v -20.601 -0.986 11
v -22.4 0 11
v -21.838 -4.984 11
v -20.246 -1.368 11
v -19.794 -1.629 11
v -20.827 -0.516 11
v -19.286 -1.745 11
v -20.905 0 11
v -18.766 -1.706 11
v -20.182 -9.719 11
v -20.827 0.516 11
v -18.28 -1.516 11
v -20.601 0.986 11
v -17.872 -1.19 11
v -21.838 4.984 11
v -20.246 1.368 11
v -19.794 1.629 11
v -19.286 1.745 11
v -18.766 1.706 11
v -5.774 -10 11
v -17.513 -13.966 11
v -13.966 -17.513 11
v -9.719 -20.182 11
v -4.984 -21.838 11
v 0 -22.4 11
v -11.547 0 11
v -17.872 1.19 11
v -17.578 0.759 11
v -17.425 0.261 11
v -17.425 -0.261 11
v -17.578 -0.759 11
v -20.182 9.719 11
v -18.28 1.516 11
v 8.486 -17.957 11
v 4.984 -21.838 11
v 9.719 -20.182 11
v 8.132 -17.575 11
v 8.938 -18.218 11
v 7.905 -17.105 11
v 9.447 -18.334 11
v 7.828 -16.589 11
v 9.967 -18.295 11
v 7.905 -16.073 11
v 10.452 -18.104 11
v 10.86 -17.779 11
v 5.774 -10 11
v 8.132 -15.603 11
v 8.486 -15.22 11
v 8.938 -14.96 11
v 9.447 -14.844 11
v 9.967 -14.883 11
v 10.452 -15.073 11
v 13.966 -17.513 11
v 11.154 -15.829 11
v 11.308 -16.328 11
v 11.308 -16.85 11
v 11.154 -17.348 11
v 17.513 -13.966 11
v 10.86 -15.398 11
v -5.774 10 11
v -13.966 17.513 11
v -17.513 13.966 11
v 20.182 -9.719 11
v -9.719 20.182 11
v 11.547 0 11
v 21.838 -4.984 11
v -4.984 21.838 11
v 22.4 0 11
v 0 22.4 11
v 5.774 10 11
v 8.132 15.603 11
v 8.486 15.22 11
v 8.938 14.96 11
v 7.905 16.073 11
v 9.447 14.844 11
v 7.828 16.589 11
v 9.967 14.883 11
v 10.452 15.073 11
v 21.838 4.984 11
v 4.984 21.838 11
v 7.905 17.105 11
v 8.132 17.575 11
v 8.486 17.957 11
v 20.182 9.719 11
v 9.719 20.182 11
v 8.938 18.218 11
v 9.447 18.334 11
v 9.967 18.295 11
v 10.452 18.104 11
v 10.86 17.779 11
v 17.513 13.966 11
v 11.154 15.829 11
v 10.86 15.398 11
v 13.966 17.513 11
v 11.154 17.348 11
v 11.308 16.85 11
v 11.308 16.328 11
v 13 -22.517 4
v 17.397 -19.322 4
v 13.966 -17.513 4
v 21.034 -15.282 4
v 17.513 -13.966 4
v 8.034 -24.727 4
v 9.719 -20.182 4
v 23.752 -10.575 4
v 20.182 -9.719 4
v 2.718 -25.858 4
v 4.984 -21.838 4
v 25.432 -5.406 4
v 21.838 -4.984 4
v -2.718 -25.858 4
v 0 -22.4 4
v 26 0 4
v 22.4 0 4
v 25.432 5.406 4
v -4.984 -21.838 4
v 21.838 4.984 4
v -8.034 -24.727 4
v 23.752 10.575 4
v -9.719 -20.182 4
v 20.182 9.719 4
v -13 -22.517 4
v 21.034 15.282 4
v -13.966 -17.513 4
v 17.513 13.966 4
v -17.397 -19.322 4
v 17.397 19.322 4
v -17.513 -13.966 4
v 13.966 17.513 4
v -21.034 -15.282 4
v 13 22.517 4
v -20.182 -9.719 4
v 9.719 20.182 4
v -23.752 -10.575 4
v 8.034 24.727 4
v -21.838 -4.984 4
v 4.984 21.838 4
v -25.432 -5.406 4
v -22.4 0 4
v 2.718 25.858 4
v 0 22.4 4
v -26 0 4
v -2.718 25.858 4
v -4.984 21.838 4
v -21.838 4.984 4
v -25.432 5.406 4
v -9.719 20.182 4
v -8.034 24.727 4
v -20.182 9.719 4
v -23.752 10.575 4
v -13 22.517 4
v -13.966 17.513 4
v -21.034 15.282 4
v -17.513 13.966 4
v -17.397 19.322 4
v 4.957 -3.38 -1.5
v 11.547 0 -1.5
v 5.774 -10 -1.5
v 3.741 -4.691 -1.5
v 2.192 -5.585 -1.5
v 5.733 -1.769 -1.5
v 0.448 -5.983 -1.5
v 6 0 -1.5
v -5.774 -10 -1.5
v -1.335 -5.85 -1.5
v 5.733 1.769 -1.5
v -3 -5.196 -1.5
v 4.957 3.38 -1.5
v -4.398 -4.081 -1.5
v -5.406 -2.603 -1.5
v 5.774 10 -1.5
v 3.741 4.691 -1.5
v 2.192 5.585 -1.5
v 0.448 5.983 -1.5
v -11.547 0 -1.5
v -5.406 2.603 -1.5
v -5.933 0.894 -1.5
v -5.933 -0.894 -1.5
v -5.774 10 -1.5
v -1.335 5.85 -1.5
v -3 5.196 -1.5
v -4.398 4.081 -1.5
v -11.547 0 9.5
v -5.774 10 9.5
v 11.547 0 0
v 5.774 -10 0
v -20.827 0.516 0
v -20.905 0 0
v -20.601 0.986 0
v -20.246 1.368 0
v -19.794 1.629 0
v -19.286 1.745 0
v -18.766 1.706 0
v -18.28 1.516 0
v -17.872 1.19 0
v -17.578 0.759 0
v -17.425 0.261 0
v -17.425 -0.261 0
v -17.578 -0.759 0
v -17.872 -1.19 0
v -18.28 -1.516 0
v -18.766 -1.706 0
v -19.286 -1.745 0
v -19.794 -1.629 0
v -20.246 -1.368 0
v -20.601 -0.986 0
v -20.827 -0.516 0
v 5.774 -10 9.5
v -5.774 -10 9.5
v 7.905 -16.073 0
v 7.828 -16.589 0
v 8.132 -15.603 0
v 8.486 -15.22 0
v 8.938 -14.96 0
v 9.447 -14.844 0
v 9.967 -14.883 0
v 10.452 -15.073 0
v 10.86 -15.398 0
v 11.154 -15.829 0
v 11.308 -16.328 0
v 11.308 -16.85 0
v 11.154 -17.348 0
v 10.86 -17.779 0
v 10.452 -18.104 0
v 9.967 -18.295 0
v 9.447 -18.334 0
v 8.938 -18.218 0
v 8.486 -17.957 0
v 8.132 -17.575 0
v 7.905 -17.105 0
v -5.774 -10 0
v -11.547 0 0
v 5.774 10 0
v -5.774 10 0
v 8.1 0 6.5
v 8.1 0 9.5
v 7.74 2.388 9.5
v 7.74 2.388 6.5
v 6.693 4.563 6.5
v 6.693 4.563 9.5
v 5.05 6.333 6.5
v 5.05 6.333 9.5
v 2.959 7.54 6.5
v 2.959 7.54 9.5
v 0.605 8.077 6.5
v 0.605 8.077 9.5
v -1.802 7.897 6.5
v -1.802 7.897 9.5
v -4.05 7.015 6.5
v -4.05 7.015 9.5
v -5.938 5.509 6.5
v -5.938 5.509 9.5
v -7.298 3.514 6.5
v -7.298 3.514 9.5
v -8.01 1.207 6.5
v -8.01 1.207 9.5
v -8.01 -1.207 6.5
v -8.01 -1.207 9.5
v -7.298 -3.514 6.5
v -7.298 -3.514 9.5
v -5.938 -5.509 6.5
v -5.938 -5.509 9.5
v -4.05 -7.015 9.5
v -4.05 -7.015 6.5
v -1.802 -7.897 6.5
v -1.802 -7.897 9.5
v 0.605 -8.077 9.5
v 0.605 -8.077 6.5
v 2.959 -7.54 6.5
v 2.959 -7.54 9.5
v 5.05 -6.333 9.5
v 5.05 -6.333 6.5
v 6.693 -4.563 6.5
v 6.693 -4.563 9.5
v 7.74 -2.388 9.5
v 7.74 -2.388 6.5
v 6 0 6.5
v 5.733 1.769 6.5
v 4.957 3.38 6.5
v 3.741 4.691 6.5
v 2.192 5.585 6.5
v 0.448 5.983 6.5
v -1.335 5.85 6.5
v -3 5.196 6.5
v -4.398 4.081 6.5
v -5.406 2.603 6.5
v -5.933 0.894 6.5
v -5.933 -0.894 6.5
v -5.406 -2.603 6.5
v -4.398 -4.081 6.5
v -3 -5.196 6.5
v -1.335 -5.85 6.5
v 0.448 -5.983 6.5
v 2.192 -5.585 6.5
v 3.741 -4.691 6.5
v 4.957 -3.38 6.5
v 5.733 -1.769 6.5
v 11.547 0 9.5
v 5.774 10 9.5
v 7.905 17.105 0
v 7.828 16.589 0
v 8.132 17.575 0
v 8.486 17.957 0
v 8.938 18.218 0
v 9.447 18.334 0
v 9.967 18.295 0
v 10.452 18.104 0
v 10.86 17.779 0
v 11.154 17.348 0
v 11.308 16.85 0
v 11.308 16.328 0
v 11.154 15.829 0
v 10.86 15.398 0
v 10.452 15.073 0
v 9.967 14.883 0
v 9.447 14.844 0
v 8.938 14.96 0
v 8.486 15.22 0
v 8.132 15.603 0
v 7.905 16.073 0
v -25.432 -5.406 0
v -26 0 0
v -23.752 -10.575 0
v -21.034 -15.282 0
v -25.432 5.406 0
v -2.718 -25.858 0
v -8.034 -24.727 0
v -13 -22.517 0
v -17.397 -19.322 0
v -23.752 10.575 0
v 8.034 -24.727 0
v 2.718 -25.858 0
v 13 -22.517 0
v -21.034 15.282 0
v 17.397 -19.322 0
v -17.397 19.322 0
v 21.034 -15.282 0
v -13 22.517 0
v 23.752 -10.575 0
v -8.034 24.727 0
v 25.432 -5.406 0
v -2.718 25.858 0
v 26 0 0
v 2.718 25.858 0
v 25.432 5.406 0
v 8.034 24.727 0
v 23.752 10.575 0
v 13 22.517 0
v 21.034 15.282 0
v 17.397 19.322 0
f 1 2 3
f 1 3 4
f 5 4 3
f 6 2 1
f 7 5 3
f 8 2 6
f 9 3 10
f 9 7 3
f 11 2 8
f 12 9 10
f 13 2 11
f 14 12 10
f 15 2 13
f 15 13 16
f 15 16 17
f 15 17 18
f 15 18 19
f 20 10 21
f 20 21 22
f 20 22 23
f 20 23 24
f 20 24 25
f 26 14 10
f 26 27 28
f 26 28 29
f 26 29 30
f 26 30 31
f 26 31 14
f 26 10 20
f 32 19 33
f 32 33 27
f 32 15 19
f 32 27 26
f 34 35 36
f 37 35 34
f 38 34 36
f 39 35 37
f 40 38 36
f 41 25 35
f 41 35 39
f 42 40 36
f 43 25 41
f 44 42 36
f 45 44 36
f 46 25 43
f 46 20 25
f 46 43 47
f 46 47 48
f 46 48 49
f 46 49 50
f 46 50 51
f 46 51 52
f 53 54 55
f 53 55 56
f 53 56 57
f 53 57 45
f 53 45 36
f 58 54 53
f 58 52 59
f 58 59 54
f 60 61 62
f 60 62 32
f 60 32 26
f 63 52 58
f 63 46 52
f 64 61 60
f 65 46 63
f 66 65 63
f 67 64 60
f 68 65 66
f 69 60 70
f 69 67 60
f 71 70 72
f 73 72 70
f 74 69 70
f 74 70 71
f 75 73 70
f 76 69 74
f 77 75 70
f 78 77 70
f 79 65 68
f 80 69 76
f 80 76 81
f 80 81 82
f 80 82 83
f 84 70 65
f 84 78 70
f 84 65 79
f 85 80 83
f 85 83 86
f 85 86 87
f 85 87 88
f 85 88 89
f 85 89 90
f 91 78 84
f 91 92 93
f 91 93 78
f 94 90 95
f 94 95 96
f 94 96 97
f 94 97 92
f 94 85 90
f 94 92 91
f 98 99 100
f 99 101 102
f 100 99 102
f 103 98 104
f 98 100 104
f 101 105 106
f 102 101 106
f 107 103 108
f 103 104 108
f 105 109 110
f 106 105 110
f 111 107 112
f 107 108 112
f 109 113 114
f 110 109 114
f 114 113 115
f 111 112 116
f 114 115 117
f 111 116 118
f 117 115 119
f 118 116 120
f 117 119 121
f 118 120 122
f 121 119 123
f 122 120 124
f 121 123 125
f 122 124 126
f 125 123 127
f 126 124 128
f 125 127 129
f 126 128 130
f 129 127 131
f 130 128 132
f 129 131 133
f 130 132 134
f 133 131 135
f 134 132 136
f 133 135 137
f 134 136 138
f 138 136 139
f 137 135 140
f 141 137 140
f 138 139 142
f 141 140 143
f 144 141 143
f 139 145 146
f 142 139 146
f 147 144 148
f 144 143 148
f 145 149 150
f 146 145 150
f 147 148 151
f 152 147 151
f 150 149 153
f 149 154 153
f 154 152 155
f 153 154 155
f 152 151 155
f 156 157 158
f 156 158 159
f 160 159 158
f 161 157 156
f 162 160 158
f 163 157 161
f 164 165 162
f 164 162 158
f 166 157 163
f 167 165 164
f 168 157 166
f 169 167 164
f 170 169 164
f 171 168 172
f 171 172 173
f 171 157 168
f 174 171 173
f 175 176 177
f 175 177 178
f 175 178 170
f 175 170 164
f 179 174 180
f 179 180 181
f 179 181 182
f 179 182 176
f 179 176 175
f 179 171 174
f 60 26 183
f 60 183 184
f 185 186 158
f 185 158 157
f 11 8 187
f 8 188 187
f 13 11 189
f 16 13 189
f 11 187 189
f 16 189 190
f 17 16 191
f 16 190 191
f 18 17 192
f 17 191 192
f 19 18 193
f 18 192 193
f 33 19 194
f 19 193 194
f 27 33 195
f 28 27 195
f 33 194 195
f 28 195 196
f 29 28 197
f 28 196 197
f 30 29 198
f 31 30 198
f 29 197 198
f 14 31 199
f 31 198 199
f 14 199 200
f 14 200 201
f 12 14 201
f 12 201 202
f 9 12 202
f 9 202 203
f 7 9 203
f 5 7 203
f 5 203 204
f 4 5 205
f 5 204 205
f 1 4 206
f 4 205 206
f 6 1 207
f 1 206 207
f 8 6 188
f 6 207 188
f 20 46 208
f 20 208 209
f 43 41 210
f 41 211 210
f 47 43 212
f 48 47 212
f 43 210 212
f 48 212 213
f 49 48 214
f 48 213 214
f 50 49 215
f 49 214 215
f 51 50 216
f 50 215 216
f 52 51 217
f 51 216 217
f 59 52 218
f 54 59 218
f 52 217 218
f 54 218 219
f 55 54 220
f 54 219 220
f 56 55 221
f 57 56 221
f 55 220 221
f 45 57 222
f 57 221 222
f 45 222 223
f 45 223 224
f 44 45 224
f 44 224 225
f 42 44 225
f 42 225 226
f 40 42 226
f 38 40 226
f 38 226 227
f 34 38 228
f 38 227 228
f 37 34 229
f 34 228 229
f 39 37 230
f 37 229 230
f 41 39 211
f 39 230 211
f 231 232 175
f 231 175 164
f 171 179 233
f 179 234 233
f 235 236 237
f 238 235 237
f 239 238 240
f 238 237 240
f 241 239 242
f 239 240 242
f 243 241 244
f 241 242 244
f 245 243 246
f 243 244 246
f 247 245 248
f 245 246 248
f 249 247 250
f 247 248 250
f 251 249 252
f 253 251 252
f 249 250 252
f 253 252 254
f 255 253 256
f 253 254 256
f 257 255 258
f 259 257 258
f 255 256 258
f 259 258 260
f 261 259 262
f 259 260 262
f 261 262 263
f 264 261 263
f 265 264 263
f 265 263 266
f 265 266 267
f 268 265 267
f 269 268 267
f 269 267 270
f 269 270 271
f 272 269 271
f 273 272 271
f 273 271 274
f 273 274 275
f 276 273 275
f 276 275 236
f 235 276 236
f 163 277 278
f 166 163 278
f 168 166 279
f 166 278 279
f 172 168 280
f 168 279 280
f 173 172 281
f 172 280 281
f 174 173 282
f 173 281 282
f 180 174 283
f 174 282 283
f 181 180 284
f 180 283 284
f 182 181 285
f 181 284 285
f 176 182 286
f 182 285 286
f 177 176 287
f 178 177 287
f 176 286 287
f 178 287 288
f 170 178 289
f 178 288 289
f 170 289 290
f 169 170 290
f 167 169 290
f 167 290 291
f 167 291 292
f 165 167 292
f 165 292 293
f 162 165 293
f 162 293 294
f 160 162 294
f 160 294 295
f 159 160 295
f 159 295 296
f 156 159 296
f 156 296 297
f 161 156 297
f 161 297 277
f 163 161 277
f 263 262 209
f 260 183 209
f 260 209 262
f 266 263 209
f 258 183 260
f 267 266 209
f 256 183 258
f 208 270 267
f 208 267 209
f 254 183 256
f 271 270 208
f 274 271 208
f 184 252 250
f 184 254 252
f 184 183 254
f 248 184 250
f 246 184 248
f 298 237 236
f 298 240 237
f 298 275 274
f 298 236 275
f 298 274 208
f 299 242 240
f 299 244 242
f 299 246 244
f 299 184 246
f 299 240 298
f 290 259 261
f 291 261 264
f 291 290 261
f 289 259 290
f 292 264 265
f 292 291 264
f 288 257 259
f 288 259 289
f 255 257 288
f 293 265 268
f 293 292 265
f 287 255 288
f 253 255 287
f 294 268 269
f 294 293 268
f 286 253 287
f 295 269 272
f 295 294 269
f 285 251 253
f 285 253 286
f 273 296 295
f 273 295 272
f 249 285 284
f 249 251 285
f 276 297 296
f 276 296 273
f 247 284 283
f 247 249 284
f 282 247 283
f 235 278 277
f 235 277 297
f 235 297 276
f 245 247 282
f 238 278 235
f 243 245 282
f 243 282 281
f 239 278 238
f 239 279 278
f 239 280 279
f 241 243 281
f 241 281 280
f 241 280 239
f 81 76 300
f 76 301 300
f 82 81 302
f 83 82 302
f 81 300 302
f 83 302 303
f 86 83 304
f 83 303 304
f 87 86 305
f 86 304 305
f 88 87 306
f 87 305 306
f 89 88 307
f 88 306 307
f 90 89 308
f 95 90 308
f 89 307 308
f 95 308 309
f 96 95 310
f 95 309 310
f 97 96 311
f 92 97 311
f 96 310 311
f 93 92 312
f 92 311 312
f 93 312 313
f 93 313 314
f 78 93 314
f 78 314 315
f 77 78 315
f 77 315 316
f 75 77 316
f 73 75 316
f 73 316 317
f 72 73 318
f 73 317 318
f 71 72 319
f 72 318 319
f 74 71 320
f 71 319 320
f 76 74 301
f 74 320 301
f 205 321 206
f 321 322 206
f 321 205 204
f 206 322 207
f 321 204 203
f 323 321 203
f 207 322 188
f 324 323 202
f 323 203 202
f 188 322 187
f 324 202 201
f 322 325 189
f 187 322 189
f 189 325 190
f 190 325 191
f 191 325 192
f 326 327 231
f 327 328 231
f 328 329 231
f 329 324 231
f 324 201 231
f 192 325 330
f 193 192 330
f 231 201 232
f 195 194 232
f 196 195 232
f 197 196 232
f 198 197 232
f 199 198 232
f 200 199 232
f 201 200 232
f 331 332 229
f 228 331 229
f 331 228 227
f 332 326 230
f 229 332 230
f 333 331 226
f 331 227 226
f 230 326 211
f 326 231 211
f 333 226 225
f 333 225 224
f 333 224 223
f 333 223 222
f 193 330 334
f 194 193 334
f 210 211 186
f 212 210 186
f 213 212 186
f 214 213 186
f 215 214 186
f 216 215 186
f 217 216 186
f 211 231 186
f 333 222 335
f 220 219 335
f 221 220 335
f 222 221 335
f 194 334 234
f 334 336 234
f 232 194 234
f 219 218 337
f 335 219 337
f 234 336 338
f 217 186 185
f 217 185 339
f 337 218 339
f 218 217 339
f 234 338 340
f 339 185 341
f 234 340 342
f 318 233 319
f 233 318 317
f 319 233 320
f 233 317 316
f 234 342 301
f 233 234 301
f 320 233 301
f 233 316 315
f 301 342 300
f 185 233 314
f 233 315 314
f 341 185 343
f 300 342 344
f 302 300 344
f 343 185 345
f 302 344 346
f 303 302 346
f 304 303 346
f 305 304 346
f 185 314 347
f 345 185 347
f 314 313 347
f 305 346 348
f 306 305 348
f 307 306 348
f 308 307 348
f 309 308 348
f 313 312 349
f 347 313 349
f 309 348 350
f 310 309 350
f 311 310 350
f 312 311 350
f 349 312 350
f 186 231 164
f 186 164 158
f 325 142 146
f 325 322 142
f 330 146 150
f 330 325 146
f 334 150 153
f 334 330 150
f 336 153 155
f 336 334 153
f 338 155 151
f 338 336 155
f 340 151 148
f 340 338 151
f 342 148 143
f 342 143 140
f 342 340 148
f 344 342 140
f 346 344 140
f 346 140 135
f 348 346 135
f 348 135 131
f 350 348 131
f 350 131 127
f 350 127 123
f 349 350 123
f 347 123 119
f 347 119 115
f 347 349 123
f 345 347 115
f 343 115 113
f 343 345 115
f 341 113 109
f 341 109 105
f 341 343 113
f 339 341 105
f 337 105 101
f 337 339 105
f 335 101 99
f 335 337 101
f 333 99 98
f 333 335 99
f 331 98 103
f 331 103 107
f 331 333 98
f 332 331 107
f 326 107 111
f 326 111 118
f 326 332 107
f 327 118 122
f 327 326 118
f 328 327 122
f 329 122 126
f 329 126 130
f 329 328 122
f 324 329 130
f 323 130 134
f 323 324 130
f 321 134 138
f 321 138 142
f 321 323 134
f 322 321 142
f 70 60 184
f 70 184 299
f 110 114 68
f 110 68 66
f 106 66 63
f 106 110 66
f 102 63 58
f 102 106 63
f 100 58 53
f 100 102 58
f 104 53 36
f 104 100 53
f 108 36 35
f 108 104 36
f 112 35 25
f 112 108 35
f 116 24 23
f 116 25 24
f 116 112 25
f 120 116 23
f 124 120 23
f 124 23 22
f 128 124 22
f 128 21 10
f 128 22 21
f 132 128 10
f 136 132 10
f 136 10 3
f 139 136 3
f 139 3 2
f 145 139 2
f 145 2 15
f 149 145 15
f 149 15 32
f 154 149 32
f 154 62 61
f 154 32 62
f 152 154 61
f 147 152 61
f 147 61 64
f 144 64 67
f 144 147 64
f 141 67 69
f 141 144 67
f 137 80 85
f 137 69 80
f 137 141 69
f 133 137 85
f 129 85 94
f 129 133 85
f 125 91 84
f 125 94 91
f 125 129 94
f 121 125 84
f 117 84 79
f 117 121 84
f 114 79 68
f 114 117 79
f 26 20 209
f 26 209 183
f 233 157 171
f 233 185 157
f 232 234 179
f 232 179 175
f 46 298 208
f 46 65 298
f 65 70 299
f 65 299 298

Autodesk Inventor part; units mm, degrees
ref_plane "YZ Plane" through (0, 0, 0) normal (1, 0, 0) x (0, 1, 0)
ref_plane "XZ Plane" through (0, 0, 0) normal (0, 1, 0) x (-1, 0, 0)
sketch "Sketch1" plane through (0, 0, 0) normal (0, 0, 1) x (1, 0, 0)
  circle A0 centre (0, 0) radius 22.4
  dimension "d0" = 44.8
extrude "Extrusion1" add sketch "Sketch1" along normal blind 11
sketch "Sketch8" plane through (0, 0, 0) normal (0, 0, -1) x (-1, 0, 0)
  circle A0 centre (0, 0) radius 26
  dimension "d23" = 52
extrude "Extrusion7" add sketch "Sketch8" against normal blind 4
sketch "Sketch2" plane through (0, 0, 0) normal (0, 0, -1) x (-1, 0, 0)
  circle A0 centre (19.155, 0) radius 1.75
  circle A1 centre (-9.5775, 16.5887) radius 1.75
  circle A2 centre (-9.5775, -16.5887) radius 1.75
  point P0 (0, 0)
  dimension "d3" = 3.5
  dimension "d4" = 19.155
  dimension "d7" = 360
extrude "Extrusion2" cut sketch "Sketch2" against normal through all
sketch "Sketch3" plane through (0, 0, 11) normal (0, 0, 1) x (1, 0, 0)
  circle A0 centre (0, 0) radius 6
  dimension "d11" = 12
extrude "Extrusion3" cut sketch "Sketch3" against normal blind 2
sketch "Sketch4" plane through (0, 0, 11) normal (0, 0, 1) x (1, 0, 0)
  circle A0 centre (0, 0) radius 6 projected
  line L0 (11.547, 0) -> (5.7735, -10)
  line L1 (5.7735, -10) -> (-5.7735, -10)
  line L2 (-5.7735, -10) -> (-11.547, 0)
  line L3 (-11.547, 0) -> (-5.7735, 10)
  line L4 (-5.7735, 10) -> (5.7735, 10)
  line L5 (5.7735, 10) -> (11.547, 0)
  circle A1 centre (0, 0) radius 6
  dimension "d14" = 10
extrude "Extrusion4" cut sketch "Sketch4" against normal blind 1.5
sketch "Sketch5" plane through (0, 0, 0) normal (0, 0, -1) x (-1, 0, 0)
  line L0 (5.7735, 10) -> (-5.7735, 10) projected
  line L1 (-5.7735, 10) -> (5.7735, 10)
  line L2 (5.7735, 10) -> (11.547, 0)
  line L3 (11.547, 0) -> (5.7735, -10)
  line L4 (5.7735, -10) -> (-5.7735, -10)
  line L5 (-5.7735, -10) -> (-11.547, 0)
  line L6 (-11.547, 0) -> (-5.7735, 10)
  point P0 (0, 0)
  point P1 (0, 0)
extrude "Extrusion5" add sketch "Sketch5" along normal blind 1.5
ref_plane "Work Plane1" through (0, 0, 4.5) normal (0, 0, 1) x (1, 0, 0)
sketch "Sketch6" plane through (0, 0, 4.5) normal (0, 0, 1) x (1, 0, 0)
  circle A0 centre (0, 0) radius 22.6071
  circle A1 centre (0, 0) radius 21.1
  dimension "d20" = 42.2
extrude "Extrusion6" [suppressed]
sketch "Sketch7" plane through (0, 0, 0) normal (0, 0, -1) x (-1, 0, 0)
  point P0 (0, 0)
sketch "Sketch9" plane through (0, 0, 9.5) normal (0, 0, 1) x (1, 0, 0)
  circle A0 centre (0, 0) radius 6 projected
  circle A1 centre (0, 0) radius 8.1
  dimension "d26" = 16.2
extrude "Extrusion8" cut sketch "Sketch9" against normal blind 3 contours A0 | A1
sketch "Sketch10" plane through (0, 0, 6.5) normal (0, 0, 1) x (1, 0, 0)
  circle A0 centre (0, 0) radius 6
  dimension "d29" = 12
extrude "Extrusion9" cut sketch "Sketch10" against normal through all
properties part number "Planet Carrier 2"
